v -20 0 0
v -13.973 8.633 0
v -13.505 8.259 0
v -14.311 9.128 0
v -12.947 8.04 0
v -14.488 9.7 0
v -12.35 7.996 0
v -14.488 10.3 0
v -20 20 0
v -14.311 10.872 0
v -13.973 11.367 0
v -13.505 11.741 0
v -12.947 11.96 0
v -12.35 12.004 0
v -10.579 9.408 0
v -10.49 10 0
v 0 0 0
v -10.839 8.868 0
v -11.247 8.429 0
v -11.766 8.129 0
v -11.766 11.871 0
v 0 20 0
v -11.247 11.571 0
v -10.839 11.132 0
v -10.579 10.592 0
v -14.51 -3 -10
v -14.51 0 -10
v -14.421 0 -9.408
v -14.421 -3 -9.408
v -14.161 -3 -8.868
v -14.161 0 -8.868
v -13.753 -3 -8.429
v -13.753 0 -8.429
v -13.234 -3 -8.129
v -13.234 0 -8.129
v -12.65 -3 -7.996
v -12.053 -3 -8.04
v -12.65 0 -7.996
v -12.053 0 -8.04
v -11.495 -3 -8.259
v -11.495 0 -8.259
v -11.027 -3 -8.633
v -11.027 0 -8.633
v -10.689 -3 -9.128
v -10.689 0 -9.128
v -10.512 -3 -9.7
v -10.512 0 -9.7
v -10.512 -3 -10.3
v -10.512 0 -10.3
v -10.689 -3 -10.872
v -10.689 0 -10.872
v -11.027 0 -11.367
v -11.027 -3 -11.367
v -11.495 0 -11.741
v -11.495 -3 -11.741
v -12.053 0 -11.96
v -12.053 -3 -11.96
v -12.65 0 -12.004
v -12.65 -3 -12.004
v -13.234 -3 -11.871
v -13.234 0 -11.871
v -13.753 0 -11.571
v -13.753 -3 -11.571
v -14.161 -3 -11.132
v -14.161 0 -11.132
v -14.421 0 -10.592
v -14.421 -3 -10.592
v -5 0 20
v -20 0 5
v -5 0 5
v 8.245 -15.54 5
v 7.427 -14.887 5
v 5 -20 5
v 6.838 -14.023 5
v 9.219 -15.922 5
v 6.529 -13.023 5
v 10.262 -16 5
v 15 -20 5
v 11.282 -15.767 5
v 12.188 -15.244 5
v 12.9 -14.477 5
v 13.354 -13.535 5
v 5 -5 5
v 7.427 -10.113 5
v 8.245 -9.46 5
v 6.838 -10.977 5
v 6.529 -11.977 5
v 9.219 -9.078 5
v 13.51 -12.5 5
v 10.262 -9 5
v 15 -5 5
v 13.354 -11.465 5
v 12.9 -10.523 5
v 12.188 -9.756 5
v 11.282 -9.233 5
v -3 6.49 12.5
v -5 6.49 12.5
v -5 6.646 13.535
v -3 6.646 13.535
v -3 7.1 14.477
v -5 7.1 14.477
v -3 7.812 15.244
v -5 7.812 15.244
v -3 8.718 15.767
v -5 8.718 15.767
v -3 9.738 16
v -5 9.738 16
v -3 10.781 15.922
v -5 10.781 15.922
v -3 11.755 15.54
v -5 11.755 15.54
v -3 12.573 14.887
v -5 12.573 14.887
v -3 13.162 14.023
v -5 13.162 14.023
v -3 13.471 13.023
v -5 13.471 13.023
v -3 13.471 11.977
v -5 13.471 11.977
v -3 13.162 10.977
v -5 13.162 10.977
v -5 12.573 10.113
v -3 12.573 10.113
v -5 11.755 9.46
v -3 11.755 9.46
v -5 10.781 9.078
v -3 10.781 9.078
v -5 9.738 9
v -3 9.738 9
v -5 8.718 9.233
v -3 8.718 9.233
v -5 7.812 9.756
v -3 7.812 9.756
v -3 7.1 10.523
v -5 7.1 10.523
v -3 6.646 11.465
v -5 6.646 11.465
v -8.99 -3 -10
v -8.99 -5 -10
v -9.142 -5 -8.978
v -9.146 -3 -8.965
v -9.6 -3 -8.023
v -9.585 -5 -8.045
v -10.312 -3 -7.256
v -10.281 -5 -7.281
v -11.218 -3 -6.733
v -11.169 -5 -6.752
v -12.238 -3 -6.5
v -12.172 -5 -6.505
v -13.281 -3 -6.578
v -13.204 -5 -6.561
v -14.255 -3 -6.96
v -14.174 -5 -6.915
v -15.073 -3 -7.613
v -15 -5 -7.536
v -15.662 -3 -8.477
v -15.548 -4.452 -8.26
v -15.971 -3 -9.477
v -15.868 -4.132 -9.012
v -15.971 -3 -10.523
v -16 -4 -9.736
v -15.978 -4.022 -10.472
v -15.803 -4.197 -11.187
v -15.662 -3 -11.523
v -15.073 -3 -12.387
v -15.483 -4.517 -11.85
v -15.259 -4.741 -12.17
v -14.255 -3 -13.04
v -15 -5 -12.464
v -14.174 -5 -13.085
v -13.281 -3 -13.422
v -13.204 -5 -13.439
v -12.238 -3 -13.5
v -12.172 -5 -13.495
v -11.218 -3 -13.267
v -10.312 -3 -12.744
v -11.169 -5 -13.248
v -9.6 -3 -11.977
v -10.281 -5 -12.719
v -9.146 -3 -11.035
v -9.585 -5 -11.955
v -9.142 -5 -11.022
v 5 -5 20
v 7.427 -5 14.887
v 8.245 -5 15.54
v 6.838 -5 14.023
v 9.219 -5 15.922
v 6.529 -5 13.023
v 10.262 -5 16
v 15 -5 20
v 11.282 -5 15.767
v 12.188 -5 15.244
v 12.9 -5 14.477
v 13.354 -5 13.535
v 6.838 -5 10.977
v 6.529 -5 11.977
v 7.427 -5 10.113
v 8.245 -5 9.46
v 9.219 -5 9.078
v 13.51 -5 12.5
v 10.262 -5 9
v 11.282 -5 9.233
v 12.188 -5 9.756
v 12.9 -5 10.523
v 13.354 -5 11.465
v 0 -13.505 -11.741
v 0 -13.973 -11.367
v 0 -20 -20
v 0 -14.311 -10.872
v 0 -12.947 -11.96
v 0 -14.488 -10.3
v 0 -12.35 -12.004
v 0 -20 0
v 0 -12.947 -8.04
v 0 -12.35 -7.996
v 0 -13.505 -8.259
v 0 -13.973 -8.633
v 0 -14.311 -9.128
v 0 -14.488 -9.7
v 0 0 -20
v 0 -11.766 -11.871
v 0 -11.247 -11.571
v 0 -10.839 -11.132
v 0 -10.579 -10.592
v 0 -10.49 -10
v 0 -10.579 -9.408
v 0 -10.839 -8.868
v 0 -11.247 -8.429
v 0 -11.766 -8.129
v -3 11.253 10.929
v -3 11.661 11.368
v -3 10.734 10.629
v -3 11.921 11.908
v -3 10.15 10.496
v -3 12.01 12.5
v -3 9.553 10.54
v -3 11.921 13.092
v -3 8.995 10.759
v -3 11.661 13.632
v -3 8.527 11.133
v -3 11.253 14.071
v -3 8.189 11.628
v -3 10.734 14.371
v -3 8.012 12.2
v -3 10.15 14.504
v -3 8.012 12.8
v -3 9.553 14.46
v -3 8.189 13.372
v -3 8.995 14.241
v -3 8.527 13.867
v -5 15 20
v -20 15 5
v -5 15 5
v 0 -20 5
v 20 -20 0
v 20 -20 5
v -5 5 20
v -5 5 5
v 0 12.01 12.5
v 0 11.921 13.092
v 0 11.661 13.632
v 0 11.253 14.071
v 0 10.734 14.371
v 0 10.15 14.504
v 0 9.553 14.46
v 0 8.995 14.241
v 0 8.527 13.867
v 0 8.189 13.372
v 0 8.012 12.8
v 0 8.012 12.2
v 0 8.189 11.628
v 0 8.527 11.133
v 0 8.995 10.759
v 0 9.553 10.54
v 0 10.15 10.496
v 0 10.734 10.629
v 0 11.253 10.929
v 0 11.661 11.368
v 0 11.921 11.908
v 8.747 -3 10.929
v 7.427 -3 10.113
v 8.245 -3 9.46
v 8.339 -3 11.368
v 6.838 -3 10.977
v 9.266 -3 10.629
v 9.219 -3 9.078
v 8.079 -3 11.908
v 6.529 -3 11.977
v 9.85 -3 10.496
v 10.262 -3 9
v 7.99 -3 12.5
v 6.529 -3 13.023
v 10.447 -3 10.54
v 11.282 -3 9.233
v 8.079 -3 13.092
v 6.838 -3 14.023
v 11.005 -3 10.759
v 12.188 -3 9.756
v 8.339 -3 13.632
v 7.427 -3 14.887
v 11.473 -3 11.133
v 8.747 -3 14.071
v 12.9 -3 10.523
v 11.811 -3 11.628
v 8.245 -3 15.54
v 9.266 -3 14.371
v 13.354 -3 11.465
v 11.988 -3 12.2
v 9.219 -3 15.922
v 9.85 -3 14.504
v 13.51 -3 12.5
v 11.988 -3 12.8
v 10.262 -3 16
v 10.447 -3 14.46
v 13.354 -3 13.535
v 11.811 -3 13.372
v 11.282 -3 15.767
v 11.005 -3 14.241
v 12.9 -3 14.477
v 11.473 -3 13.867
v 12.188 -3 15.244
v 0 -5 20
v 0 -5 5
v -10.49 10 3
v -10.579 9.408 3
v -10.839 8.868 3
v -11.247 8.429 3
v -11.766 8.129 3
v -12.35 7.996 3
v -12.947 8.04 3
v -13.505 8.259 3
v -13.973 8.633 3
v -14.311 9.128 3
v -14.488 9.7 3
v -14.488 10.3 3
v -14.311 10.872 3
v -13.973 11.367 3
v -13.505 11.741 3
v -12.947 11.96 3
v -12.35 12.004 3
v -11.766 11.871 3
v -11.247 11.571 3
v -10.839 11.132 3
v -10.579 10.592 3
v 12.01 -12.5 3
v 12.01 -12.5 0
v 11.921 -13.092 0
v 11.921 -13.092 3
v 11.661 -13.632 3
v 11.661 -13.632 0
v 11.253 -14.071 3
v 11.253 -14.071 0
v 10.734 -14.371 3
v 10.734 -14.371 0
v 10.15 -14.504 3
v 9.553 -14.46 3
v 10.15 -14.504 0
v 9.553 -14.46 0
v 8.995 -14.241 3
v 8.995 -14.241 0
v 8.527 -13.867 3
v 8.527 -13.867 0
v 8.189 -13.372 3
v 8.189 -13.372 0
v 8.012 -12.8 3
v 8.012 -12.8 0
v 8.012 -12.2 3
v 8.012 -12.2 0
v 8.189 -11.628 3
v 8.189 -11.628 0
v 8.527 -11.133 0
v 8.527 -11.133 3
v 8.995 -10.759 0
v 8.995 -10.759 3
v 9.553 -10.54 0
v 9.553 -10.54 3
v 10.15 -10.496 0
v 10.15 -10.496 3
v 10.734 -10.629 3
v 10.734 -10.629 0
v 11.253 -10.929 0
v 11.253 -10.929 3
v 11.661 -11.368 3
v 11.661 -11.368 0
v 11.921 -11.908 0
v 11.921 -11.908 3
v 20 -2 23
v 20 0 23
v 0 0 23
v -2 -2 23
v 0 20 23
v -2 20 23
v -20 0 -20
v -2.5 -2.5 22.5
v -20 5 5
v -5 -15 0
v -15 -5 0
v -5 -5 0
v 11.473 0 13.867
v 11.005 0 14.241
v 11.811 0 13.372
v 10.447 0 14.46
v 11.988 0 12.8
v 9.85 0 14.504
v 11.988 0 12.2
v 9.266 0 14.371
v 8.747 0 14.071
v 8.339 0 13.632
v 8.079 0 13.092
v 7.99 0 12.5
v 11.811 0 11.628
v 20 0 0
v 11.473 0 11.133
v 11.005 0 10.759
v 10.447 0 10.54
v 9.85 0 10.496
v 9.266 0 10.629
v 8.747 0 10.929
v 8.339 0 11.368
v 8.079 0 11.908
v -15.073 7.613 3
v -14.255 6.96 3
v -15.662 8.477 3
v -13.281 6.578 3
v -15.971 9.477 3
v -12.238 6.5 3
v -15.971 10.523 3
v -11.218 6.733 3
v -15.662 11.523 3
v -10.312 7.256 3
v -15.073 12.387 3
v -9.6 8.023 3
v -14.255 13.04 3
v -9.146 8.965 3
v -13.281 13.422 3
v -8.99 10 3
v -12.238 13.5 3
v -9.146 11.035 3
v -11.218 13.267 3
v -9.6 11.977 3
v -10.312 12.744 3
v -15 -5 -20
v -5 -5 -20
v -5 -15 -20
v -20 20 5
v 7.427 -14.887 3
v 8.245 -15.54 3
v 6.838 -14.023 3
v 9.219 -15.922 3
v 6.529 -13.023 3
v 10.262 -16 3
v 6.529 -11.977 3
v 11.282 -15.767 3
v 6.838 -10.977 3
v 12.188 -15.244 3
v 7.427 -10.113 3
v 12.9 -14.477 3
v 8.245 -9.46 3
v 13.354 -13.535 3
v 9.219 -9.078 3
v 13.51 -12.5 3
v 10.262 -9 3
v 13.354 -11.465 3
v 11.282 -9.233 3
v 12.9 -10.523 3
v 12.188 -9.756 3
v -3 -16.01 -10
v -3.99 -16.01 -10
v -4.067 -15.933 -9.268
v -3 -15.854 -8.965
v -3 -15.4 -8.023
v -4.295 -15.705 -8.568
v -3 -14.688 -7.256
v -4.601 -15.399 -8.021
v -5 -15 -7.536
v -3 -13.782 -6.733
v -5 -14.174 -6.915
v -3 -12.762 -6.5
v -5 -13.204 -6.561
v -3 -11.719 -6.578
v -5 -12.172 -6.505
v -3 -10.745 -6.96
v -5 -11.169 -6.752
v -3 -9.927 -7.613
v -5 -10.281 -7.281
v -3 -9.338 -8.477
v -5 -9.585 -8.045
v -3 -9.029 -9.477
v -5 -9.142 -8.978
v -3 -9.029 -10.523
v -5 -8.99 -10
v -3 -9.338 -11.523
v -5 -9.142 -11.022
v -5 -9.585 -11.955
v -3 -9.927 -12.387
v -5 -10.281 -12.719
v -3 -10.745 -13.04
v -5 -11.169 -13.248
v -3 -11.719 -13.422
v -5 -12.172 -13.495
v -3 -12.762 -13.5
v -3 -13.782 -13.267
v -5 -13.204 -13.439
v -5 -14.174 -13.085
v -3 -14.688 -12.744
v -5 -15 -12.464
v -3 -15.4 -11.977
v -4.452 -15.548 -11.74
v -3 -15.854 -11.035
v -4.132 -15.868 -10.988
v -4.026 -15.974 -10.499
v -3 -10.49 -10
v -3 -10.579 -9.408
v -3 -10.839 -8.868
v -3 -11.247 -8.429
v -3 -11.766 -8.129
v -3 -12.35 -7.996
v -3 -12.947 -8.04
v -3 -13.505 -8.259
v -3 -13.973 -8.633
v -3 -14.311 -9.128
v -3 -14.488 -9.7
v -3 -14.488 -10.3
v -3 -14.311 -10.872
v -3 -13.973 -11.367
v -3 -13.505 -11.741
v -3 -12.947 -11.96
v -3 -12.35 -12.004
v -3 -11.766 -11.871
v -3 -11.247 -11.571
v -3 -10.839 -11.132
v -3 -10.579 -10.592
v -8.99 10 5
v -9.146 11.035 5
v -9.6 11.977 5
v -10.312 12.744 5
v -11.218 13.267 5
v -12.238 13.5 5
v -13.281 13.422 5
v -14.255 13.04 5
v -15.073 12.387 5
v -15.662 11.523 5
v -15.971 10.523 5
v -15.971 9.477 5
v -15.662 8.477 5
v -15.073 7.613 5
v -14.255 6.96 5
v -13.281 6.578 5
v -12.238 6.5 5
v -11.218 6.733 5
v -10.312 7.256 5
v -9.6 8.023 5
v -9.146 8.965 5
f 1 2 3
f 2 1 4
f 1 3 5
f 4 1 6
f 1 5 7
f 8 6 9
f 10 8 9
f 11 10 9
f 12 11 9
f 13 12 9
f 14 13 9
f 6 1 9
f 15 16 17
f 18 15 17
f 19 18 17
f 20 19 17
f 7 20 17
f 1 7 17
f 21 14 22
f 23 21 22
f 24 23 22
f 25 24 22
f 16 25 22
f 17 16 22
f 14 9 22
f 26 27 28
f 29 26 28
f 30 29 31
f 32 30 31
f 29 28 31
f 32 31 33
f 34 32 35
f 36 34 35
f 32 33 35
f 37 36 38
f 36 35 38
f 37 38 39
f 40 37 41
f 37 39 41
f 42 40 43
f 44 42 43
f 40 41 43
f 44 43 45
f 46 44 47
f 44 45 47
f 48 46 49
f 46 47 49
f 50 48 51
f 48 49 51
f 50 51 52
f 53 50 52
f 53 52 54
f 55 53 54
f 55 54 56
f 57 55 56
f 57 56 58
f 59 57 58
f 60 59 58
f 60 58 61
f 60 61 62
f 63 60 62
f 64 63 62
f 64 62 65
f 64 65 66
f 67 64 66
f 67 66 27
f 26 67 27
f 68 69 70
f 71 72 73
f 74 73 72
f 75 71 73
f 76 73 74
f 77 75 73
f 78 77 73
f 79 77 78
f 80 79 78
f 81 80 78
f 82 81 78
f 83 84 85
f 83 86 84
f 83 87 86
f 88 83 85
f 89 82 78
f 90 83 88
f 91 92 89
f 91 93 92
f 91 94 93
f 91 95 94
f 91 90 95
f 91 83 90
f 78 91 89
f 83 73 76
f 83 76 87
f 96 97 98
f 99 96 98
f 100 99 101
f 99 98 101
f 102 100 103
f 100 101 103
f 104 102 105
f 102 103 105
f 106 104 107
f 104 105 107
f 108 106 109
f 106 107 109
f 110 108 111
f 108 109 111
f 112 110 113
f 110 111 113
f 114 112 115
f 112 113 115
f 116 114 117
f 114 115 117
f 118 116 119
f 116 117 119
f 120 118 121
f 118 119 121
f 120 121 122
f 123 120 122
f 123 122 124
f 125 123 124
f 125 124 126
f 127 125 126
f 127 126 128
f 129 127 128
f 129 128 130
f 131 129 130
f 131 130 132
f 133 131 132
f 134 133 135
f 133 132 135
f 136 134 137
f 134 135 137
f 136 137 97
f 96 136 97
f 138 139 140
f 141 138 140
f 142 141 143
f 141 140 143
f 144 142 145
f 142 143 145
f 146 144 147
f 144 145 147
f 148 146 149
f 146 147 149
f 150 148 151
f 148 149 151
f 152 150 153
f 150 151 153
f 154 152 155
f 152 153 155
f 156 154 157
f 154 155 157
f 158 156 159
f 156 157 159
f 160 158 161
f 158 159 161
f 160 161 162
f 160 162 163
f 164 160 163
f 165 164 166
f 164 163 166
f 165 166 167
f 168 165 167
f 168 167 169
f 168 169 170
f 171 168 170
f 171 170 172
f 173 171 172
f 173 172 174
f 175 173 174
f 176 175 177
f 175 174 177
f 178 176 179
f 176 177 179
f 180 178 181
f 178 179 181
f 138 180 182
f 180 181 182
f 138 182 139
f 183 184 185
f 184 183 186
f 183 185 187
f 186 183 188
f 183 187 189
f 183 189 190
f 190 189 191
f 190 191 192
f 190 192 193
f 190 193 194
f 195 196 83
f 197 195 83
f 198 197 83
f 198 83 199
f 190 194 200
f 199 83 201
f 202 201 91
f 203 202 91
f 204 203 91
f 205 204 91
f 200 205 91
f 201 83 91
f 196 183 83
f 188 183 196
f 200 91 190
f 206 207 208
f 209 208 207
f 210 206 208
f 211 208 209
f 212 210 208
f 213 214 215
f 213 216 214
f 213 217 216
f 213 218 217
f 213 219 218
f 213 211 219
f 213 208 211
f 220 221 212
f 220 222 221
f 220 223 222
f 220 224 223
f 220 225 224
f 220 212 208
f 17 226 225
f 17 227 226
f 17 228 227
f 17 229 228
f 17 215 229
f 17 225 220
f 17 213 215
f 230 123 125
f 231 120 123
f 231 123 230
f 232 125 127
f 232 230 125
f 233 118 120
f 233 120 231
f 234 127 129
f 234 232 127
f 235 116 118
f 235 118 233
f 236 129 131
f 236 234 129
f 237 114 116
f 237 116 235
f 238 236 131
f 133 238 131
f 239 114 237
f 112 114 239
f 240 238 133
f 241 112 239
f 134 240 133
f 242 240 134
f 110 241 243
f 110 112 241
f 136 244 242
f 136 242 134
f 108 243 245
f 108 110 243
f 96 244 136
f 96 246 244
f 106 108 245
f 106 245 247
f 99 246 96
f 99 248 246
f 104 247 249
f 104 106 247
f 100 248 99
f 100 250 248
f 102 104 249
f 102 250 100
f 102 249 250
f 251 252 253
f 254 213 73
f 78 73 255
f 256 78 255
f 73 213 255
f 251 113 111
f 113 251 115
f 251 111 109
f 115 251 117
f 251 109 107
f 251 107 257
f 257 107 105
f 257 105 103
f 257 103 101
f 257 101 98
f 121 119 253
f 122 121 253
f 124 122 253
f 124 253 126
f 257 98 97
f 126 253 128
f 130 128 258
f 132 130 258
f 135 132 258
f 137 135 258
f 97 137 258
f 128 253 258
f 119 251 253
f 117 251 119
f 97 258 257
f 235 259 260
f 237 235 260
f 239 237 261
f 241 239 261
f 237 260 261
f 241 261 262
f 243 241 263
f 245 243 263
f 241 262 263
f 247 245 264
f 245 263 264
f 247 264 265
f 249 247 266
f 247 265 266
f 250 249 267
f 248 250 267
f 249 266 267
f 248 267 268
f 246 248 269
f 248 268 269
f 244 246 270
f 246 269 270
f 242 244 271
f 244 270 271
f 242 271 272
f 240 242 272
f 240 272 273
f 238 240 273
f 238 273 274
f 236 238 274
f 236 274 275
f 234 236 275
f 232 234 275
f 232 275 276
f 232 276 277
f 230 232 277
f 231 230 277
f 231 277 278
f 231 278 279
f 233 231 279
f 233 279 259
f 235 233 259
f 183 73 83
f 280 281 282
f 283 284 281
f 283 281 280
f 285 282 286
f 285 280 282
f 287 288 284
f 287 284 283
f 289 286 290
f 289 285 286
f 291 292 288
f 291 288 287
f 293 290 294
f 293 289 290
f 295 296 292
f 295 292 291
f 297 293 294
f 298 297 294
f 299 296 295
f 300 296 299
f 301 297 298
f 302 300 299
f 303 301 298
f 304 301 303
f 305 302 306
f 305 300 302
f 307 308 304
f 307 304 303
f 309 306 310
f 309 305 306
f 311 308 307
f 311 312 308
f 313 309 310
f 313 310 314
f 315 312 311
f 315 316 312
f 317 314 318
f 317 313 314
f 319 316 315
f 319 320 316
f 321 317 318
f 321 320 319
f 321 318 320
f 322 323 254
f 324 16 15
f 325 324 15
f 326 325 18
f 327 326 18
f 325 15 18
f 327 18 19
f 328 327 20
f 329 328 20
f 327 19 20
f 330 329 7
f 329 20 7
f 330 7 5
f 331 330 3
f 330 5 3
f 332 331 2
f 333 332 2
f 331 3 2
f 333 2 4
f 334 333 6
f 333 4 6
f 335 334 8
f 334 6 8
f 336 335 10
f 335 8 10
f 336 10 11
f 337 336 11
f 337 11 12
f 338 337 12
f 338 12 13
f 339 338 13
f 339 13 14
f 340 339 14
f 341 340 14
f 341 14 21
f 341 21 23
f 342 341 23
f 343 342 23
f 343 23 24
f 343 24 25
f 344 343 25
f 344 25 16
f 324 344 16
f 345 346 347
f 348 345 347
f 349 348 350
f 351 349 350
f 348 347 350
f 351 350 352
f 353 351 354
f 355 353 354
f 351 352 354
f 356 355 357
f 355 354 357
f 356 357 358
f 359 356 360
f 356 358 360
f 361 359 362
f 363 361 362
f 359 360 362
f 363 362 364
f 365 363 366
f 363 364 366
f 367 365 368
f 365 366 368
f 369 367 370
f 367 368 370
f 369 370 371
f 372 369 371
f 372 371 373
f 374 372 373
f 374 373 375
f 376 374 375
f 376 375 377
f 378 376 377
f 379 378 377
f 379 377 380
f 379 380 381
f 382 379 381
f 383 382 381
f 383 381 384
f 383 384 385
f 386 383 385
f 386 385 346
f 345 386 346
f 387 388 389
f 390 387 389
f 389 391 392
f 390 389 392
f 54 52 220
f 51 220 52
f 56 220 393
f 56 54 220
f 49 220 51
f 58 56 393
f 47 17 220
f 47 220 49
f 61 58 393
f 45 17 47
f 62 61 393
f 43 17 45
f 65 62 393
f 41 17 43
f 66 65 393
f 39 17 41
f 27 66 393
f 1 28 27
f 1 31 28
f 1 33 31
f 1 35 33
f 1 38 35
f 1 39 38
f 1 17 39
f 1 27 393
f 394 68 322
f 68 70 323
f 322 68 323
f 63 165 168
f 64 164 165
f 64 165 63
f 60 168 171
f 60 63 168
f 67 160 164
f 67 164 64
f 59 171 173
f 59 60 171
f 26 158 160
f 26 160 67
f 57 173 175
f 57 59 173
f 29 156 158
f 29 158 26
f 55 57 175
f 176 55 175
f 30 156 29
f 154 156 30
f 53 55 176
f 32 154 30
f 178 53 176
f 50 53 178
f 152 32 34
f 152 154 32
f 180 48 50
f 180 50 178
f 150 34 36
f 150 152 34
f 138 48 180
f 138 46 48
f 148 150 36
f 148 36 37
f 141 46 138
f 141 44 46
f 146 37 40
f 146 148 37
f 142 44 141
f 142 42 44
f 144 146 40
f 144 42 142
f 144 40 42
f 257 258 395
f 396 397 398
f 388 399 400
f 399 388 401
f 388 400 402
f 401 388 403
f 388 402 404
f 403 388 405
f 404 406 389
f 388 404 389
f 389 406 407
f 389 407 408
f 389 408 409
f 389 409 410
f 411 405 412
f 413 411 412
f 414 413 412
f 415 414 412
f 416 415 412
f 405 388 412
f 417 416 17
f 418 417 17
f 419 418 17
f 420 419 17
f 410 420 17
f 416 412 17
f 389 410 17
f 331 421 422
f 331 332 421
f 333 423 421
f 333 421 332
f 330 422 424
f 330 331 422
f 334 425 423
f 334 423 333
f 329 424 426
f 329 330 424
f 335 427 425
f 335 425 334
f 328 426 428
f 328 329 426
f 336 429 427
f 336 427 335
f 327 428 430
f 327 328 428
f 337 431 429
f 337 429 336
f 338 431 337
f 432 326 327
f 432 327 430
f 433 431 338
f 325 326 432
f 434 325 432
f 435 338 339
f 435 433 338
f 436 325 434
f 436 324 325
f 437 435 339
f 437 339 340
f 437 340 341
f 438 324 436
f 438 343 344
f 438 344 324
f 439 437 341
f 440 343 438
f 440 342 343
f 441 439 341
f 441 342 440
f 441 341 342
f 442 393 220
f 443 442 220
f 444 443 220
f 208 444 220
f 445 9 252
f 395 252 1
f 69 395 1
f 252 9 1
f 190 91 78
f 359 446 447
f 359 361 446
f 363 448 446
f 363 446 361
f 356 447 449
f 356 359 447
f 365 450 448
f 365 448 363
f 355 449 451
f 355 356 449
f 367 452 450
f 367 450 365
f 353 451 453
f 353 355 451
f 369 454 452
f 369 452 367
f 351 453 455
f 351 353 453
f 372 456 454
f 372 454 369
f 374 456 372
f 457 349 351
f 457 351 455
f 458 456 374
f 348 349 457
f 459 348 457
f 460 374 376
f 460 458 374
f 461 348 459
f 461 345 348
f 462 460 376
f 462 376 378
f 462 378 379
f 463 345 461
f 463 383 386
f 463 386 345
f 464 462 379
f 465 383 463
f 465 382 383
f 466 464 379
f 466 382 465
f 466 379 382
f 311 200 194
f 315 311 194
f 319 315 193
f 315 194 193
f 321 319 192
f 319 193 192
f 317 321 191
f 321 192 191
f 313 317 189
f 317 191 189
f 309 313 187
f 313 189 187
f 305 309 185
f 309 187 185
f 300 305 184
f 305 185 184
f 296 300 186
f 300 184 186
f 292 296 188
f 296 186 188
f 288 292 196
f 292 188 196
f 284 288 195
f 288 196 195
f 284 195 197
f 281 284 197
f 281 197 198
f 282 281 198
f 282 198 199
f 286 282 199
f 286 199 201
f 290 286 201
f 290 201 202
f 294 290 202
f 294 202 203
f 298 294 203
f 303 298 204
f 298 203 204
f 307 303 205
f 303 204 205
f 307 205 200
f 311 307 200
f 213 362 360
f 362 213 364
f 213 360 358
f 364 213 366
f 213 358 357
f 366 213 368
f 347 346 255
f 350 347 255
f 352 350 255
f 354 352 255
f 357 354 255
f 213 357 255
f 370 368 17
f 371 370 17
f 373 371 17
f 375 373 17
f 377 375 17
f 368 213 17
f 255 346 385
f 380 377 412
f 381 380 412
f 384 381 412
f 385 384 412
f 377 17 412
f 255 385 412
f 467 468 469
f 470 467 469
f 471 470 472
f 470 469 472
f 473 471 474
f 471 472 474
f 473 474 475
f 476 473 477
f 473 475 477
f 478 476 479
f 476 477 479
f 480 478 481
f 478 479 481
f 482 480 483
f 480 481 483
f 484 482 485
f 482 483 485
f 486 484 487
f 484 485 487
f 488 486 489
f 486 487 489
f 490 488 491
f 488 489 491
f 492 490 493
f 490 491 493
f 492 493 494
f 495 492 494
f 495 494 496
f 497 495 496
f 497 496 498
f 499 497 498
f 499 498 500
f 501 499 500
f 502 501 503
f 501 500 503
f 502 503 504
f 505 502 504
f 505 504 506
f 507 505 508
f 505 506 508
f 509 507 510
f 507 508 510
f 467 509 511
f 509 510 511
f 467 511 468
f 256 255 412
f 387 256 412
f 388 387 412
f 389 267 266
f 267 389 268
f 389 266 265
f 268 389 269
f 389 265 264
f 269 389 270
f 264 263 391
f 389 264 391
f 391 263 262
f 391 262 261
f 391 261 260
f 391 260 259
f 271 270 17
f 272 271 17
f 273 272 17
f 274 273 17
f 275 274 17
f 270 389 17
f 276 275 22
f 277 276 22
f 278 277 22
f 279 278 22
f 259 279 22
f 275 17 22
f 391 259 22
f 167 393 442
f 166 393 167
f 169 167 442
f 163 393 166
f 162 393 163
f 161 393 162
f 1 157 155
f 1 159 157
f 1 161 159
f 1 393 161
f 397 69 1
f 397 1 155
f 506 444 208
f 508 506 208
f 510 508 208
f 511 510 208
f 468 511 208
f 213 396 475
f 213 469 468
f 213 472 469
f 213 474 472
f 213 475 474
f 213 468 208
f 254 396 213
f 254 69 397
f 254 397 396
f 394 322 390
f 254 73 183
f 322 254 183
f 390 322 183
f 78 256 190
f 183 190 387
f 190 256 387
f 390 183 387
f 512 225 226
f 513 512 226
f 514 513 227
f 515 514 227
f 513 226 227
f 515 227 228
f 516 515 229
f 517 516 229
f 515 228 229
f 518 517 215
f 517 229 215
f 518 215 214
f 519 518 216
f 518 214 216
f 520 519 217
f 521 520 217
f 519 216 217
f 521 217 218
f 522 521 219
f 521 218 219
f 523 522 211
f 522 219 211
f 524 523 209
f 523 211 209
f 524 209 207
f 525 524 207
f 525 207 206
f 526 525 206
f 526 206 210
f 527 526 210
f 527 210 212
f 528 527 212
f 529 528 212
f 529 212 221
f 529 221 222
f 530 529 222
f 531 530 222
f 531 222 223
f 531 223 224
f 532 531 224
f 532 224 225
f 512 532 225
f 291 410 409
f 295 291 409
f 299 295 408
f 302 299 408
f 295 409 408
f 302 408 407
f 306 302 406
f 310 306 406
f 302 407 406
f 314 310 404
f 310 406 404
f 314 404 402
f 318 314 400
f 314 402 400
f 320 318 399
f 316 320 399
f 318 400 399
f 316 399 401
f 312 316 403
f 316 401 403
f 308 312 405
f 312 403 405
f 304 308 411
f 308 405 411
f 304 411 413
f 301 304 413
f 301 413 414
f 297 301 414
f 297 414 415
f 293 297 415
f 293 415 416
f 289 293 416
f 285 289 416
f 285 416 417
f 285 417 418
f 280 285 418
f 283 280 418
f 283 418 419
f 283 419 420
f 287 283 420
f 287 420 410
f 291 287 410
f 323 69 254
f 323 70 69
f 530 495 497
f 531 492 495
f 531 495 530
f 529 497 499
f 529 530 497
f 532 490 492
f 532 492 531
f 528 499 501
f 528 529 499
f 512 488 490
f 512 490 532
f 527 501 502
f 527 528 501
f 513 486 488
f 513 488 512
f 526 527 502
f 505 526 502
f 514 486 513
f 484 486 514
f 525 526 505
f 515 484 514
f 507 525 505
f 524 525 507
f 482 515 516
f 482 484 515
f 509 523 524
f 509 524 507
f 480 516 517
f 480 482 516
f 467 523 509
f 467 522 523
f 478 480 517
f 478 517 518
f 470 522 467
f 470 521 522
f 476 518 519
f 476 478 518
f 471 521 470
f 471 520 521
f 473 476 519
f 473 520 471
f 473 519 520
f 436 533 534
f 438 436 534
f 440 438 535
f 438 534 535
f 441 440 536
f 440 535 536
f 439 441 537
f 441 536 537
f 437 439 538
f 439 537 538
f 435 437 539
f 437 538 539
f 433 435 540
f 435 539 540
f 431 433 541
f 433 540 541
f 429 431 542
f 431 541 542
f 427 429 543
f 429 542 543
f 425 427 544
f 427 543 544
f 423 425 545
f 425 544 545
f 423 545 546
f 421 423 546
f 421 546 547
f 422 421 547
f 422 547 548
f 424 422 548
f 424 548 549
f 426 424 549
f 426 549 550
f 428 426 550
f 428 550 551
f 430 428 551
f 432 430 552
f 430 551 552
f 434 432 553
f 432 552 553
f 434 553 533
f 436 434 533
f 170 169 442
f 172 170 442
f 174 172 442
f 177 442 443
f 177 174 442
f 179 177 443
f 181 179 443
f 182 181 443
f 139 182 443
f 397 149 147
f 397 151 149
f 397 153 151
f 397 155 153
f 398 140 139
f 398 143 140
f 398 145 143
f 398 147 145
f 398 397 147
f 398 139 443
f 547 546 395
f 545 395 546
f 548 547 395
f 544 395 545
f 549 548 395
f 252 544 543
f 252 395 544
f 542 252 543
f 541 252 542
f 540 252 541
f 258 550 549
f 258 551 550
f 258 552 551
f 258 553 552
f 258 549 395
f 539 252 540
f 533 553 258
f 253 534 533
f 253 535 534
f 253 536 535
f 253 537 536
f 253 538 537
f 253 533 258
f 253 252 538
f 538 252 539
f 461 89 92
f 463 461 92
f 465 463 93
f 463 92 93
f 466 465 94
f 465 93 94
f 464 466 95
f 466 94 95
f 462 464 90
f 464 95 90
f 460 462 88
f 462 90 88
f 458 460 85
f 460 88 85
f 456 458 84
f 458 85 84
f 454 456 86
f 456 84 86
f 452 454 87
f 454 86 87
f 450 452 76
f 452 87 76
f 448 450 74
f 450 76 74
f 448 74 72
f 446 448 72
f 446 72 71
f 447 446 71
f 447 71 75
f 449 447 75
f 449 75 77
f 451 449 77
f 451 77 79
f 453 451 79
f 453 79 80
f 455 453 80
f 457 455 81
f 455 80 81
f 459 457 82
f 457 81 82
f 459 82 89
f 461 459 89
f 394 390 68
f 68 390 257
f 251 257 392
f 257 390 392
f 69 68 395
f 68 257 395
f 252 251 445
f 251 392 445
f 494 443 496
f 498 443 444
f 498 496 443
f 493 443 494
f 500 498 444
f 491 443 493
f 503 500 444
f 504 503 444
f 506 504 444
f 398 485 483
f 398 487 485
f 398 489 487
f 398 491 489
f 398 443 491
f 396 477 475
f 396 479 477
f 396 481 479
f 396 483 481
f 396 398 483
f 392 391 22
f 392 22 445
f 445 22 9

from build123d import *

# Parameters (mm, degrees)
F1_DEPTH  = 5
F3_DEPTH  = 20
F5_DEPTH  = 40.001
F7_DEPTH  = 40.001
F8_R      = 2.01
F9_DEPTH  = 5
F10_R     = 2.01
F11_DEPTH = 5
F12_R     = 3.51
F13_DEPTH = 2
F14_R     = 3.51
F15_DEPTH = 2
F16_R     = 2.01
F17_DEPTH = 5
F18_R     = 3.51
F19_DEPTH = 2
F20_R     = 3.51
F21_DEPTH = 2
F23_DEPTH = 20
F24_R     = 2.01
F25_DEPTH = 5
F26_R     = 2.01
F27_DEPTH = 5
F28_R     = 3.51
F29_DEPTH = 2
F30_R     = 3.51
F31_DEPTH = 2
F32_W     = 20
F32_H     = 2
F33_DEPTH = 20.001
F35_DEPTH = 20.001


with BuildPart() as f1:
    # F0 (on Top) → F1 (new body)
    with BuildSketch(Plane.XY):
        Polygon((20, 0), (0, 0), (0, 20), (-20, 20), (-20, 0), (0, -20), (20, -20), align=None)
    extrude(amount=F1_DEPTH)

    # F2 (on face) → F3 (join)
    with BuildSketch(Plane.XY.offset(5)):
        Polygon((15, -20), (20, -20), (20, 0), (0, 0), (0, 20), (-5, 20), (-20, 20), (-20, 15), (-5, 15), (-5, 5), (-20, 5), (-20, 0), (-5, 0), (0, -5), (0, -20), (5, -20), (5, -5), (15, -5), align=None)
    extrude(amount=F3_DEPTH)

    # F4 (on face) → F5 (cut, through all)
    with BuildSketch(Plane.YZ.offset(20)):
        Polygon((-20, 5), (0, 25), (-20, 25), align=None)
    extrude(amount=-F5_DEPTH, mode=Mode.SUBTRACT)

    # F6 (on face) → F7 (cut, through all)
    with BuildSketch(Plane(origin=(0, 20, 0), x_dir=(-1, 0, 0), z_dir=(0, 1, 0))):
        Polygon((0, 25), (20, 5), (20, 25), align=None)
    extrude(amount=-F7_DEPTH, mode=Mode.SUBTRACT)

    # F8 (on face) → F9 (cut)
    with BuildSketch(Plane.YZ):
        with Locations((10, 12.5)):
            Circle(F8_R)
    extrude(amount=-F9_DEPTH, mode=Mode.SUBTRACT)

    # F10 (on face) → F11 (cut)
    with BuildSketch(Plane(origin=(0, 0, 0), x_dir=(-1, 0, 0), z_dir=(0, 1, 0))):
        with Locations((-10, 12.5)):
            Circle(F10_R)
    extrude(amount=-F11_DEPTH, mode=Mode.SUBTRACT)

    # F12 (on face) → F13 (cut)
    with BuildSketch(Plane.XZ.offset(5)):
        with Locations((10, 12.5)):
            Circle(F12_R)
    extrude(amount=-F13_DEPTH, mode=Mode.SUBTRACT)

    # F14 (on face) → F15 (cut)
    with BuildSketch(Plane(origin=(-5, 0, 0), x_dir=(0, -1, 0), z_dir=(-1, 0, 0))):
        with Locations((-10, 12.5)):
            Circle(F14_R)
    extrude(amount=-F15_DEPTH, mode=Mode.SUBTRACT)

    # F16 (on face) → F17 (cut)
    with BuildSketch(Plane(origin=(0, 0, 0), x_dir=(1, 0, 0), z_dir=(0, 0, -1))):
        with Locations((-12.5, -10)):
            Circle(F16_R)
        with Locations((10, 12.5)):
            Circle(F16_R)
    extrude(amount=-F17_DEPTH, mode=Mode.SUBTRACT)

    # F18 (on face) → F19 (cut)
    with BuildSketch(Plane.XY.offset(5)):
        with Locations((-12.5, 10)):
            Circle(F18_R)
    extrude(amount=-F19_DEPTH, mode=Mode.SUBTRACT)

    # F20 (on face) → F21 (cut)
    with BuildSketch(Plane.XY.offset(5)):
        with Locations((10, -12.5)):
            Circle(F20_R)
    extrude(amount=-F21_DEPTH, mode=Mode.SUBTRACT)

    # F22 (on Top) → F23 (join)
    with BuildSketch(Plane.XY):
        Polygon((0, -20), (0, 0), (-20, 0), (-15, -5), (-10, -5), (-5, -5), (-5, -10), (-5, -15), align=None)
    extrude(amount=-F23_DEPTH)

    # F24 (on face) → F25 (cut)
    with BuildSketch(Plane.YZ):
        with Locations((-12.5, -10)):
            Circle(F24_R)
    extrude(amount=-F25_DEPTH, mode=Mode.SUBTRACT)

    # F26 (on face) → F27 (cut)
    with BuildSketch(Plane(origin=(0, 0, 0), x_dir=(-1, 0, 0), z_dir=(0, 1, 0))):
        with Locations((12.5, -10)):
            Circle(F26_R)
    extrude(amount=-F27_DEPTH, mode=Mode.SUBTRACT)

    # F28 (on face) → F29 (cut)
    with BuildSketch(Plane(origin=(-5, 0, 0), x_dir=(0, -1, 0), z_dir=(-1, 0, 0))):
        with Locations((12.5, -10)):
            Circle(F28_R)
    extrude(amount=-F29_DEPTH, mode=Mode.SUBTRACT)

    # F30 (on face) → F31 (cut)
    with BuildSketch(Plane.XZ.offset(5)):
        with Locations((-12.5, -10)):
            Circle(F30_R)
    extrude(amount=-F31_DEPTH, mode=Mode.SUBTRACT)

    # F32 (on face) → F33 (cut, through all)
    with BuildSketch(Plane(origin=(0, 0, 0), x_dir=(-1, 0, 0), z_dir=(0, 1, 0))):
        with Locations((-10, 24)):
            Rectangle(F32_W, F32_H)
    extrude(amount=-F33_DEPTH, mode=Mode.SUBTRACT)

    # F34 (on face) → F35 (cut, through all)
    with BuildSketch(Plane.YZ):
        Polygon((-2.924178, 22.901505), (-2, 23), (20, 23), (20, 25), (-2.924178, 25), align=None)
    extrude(amount=-F35_DEPTH, mode=Mode.SUBTRACT)


solid = f1.part
